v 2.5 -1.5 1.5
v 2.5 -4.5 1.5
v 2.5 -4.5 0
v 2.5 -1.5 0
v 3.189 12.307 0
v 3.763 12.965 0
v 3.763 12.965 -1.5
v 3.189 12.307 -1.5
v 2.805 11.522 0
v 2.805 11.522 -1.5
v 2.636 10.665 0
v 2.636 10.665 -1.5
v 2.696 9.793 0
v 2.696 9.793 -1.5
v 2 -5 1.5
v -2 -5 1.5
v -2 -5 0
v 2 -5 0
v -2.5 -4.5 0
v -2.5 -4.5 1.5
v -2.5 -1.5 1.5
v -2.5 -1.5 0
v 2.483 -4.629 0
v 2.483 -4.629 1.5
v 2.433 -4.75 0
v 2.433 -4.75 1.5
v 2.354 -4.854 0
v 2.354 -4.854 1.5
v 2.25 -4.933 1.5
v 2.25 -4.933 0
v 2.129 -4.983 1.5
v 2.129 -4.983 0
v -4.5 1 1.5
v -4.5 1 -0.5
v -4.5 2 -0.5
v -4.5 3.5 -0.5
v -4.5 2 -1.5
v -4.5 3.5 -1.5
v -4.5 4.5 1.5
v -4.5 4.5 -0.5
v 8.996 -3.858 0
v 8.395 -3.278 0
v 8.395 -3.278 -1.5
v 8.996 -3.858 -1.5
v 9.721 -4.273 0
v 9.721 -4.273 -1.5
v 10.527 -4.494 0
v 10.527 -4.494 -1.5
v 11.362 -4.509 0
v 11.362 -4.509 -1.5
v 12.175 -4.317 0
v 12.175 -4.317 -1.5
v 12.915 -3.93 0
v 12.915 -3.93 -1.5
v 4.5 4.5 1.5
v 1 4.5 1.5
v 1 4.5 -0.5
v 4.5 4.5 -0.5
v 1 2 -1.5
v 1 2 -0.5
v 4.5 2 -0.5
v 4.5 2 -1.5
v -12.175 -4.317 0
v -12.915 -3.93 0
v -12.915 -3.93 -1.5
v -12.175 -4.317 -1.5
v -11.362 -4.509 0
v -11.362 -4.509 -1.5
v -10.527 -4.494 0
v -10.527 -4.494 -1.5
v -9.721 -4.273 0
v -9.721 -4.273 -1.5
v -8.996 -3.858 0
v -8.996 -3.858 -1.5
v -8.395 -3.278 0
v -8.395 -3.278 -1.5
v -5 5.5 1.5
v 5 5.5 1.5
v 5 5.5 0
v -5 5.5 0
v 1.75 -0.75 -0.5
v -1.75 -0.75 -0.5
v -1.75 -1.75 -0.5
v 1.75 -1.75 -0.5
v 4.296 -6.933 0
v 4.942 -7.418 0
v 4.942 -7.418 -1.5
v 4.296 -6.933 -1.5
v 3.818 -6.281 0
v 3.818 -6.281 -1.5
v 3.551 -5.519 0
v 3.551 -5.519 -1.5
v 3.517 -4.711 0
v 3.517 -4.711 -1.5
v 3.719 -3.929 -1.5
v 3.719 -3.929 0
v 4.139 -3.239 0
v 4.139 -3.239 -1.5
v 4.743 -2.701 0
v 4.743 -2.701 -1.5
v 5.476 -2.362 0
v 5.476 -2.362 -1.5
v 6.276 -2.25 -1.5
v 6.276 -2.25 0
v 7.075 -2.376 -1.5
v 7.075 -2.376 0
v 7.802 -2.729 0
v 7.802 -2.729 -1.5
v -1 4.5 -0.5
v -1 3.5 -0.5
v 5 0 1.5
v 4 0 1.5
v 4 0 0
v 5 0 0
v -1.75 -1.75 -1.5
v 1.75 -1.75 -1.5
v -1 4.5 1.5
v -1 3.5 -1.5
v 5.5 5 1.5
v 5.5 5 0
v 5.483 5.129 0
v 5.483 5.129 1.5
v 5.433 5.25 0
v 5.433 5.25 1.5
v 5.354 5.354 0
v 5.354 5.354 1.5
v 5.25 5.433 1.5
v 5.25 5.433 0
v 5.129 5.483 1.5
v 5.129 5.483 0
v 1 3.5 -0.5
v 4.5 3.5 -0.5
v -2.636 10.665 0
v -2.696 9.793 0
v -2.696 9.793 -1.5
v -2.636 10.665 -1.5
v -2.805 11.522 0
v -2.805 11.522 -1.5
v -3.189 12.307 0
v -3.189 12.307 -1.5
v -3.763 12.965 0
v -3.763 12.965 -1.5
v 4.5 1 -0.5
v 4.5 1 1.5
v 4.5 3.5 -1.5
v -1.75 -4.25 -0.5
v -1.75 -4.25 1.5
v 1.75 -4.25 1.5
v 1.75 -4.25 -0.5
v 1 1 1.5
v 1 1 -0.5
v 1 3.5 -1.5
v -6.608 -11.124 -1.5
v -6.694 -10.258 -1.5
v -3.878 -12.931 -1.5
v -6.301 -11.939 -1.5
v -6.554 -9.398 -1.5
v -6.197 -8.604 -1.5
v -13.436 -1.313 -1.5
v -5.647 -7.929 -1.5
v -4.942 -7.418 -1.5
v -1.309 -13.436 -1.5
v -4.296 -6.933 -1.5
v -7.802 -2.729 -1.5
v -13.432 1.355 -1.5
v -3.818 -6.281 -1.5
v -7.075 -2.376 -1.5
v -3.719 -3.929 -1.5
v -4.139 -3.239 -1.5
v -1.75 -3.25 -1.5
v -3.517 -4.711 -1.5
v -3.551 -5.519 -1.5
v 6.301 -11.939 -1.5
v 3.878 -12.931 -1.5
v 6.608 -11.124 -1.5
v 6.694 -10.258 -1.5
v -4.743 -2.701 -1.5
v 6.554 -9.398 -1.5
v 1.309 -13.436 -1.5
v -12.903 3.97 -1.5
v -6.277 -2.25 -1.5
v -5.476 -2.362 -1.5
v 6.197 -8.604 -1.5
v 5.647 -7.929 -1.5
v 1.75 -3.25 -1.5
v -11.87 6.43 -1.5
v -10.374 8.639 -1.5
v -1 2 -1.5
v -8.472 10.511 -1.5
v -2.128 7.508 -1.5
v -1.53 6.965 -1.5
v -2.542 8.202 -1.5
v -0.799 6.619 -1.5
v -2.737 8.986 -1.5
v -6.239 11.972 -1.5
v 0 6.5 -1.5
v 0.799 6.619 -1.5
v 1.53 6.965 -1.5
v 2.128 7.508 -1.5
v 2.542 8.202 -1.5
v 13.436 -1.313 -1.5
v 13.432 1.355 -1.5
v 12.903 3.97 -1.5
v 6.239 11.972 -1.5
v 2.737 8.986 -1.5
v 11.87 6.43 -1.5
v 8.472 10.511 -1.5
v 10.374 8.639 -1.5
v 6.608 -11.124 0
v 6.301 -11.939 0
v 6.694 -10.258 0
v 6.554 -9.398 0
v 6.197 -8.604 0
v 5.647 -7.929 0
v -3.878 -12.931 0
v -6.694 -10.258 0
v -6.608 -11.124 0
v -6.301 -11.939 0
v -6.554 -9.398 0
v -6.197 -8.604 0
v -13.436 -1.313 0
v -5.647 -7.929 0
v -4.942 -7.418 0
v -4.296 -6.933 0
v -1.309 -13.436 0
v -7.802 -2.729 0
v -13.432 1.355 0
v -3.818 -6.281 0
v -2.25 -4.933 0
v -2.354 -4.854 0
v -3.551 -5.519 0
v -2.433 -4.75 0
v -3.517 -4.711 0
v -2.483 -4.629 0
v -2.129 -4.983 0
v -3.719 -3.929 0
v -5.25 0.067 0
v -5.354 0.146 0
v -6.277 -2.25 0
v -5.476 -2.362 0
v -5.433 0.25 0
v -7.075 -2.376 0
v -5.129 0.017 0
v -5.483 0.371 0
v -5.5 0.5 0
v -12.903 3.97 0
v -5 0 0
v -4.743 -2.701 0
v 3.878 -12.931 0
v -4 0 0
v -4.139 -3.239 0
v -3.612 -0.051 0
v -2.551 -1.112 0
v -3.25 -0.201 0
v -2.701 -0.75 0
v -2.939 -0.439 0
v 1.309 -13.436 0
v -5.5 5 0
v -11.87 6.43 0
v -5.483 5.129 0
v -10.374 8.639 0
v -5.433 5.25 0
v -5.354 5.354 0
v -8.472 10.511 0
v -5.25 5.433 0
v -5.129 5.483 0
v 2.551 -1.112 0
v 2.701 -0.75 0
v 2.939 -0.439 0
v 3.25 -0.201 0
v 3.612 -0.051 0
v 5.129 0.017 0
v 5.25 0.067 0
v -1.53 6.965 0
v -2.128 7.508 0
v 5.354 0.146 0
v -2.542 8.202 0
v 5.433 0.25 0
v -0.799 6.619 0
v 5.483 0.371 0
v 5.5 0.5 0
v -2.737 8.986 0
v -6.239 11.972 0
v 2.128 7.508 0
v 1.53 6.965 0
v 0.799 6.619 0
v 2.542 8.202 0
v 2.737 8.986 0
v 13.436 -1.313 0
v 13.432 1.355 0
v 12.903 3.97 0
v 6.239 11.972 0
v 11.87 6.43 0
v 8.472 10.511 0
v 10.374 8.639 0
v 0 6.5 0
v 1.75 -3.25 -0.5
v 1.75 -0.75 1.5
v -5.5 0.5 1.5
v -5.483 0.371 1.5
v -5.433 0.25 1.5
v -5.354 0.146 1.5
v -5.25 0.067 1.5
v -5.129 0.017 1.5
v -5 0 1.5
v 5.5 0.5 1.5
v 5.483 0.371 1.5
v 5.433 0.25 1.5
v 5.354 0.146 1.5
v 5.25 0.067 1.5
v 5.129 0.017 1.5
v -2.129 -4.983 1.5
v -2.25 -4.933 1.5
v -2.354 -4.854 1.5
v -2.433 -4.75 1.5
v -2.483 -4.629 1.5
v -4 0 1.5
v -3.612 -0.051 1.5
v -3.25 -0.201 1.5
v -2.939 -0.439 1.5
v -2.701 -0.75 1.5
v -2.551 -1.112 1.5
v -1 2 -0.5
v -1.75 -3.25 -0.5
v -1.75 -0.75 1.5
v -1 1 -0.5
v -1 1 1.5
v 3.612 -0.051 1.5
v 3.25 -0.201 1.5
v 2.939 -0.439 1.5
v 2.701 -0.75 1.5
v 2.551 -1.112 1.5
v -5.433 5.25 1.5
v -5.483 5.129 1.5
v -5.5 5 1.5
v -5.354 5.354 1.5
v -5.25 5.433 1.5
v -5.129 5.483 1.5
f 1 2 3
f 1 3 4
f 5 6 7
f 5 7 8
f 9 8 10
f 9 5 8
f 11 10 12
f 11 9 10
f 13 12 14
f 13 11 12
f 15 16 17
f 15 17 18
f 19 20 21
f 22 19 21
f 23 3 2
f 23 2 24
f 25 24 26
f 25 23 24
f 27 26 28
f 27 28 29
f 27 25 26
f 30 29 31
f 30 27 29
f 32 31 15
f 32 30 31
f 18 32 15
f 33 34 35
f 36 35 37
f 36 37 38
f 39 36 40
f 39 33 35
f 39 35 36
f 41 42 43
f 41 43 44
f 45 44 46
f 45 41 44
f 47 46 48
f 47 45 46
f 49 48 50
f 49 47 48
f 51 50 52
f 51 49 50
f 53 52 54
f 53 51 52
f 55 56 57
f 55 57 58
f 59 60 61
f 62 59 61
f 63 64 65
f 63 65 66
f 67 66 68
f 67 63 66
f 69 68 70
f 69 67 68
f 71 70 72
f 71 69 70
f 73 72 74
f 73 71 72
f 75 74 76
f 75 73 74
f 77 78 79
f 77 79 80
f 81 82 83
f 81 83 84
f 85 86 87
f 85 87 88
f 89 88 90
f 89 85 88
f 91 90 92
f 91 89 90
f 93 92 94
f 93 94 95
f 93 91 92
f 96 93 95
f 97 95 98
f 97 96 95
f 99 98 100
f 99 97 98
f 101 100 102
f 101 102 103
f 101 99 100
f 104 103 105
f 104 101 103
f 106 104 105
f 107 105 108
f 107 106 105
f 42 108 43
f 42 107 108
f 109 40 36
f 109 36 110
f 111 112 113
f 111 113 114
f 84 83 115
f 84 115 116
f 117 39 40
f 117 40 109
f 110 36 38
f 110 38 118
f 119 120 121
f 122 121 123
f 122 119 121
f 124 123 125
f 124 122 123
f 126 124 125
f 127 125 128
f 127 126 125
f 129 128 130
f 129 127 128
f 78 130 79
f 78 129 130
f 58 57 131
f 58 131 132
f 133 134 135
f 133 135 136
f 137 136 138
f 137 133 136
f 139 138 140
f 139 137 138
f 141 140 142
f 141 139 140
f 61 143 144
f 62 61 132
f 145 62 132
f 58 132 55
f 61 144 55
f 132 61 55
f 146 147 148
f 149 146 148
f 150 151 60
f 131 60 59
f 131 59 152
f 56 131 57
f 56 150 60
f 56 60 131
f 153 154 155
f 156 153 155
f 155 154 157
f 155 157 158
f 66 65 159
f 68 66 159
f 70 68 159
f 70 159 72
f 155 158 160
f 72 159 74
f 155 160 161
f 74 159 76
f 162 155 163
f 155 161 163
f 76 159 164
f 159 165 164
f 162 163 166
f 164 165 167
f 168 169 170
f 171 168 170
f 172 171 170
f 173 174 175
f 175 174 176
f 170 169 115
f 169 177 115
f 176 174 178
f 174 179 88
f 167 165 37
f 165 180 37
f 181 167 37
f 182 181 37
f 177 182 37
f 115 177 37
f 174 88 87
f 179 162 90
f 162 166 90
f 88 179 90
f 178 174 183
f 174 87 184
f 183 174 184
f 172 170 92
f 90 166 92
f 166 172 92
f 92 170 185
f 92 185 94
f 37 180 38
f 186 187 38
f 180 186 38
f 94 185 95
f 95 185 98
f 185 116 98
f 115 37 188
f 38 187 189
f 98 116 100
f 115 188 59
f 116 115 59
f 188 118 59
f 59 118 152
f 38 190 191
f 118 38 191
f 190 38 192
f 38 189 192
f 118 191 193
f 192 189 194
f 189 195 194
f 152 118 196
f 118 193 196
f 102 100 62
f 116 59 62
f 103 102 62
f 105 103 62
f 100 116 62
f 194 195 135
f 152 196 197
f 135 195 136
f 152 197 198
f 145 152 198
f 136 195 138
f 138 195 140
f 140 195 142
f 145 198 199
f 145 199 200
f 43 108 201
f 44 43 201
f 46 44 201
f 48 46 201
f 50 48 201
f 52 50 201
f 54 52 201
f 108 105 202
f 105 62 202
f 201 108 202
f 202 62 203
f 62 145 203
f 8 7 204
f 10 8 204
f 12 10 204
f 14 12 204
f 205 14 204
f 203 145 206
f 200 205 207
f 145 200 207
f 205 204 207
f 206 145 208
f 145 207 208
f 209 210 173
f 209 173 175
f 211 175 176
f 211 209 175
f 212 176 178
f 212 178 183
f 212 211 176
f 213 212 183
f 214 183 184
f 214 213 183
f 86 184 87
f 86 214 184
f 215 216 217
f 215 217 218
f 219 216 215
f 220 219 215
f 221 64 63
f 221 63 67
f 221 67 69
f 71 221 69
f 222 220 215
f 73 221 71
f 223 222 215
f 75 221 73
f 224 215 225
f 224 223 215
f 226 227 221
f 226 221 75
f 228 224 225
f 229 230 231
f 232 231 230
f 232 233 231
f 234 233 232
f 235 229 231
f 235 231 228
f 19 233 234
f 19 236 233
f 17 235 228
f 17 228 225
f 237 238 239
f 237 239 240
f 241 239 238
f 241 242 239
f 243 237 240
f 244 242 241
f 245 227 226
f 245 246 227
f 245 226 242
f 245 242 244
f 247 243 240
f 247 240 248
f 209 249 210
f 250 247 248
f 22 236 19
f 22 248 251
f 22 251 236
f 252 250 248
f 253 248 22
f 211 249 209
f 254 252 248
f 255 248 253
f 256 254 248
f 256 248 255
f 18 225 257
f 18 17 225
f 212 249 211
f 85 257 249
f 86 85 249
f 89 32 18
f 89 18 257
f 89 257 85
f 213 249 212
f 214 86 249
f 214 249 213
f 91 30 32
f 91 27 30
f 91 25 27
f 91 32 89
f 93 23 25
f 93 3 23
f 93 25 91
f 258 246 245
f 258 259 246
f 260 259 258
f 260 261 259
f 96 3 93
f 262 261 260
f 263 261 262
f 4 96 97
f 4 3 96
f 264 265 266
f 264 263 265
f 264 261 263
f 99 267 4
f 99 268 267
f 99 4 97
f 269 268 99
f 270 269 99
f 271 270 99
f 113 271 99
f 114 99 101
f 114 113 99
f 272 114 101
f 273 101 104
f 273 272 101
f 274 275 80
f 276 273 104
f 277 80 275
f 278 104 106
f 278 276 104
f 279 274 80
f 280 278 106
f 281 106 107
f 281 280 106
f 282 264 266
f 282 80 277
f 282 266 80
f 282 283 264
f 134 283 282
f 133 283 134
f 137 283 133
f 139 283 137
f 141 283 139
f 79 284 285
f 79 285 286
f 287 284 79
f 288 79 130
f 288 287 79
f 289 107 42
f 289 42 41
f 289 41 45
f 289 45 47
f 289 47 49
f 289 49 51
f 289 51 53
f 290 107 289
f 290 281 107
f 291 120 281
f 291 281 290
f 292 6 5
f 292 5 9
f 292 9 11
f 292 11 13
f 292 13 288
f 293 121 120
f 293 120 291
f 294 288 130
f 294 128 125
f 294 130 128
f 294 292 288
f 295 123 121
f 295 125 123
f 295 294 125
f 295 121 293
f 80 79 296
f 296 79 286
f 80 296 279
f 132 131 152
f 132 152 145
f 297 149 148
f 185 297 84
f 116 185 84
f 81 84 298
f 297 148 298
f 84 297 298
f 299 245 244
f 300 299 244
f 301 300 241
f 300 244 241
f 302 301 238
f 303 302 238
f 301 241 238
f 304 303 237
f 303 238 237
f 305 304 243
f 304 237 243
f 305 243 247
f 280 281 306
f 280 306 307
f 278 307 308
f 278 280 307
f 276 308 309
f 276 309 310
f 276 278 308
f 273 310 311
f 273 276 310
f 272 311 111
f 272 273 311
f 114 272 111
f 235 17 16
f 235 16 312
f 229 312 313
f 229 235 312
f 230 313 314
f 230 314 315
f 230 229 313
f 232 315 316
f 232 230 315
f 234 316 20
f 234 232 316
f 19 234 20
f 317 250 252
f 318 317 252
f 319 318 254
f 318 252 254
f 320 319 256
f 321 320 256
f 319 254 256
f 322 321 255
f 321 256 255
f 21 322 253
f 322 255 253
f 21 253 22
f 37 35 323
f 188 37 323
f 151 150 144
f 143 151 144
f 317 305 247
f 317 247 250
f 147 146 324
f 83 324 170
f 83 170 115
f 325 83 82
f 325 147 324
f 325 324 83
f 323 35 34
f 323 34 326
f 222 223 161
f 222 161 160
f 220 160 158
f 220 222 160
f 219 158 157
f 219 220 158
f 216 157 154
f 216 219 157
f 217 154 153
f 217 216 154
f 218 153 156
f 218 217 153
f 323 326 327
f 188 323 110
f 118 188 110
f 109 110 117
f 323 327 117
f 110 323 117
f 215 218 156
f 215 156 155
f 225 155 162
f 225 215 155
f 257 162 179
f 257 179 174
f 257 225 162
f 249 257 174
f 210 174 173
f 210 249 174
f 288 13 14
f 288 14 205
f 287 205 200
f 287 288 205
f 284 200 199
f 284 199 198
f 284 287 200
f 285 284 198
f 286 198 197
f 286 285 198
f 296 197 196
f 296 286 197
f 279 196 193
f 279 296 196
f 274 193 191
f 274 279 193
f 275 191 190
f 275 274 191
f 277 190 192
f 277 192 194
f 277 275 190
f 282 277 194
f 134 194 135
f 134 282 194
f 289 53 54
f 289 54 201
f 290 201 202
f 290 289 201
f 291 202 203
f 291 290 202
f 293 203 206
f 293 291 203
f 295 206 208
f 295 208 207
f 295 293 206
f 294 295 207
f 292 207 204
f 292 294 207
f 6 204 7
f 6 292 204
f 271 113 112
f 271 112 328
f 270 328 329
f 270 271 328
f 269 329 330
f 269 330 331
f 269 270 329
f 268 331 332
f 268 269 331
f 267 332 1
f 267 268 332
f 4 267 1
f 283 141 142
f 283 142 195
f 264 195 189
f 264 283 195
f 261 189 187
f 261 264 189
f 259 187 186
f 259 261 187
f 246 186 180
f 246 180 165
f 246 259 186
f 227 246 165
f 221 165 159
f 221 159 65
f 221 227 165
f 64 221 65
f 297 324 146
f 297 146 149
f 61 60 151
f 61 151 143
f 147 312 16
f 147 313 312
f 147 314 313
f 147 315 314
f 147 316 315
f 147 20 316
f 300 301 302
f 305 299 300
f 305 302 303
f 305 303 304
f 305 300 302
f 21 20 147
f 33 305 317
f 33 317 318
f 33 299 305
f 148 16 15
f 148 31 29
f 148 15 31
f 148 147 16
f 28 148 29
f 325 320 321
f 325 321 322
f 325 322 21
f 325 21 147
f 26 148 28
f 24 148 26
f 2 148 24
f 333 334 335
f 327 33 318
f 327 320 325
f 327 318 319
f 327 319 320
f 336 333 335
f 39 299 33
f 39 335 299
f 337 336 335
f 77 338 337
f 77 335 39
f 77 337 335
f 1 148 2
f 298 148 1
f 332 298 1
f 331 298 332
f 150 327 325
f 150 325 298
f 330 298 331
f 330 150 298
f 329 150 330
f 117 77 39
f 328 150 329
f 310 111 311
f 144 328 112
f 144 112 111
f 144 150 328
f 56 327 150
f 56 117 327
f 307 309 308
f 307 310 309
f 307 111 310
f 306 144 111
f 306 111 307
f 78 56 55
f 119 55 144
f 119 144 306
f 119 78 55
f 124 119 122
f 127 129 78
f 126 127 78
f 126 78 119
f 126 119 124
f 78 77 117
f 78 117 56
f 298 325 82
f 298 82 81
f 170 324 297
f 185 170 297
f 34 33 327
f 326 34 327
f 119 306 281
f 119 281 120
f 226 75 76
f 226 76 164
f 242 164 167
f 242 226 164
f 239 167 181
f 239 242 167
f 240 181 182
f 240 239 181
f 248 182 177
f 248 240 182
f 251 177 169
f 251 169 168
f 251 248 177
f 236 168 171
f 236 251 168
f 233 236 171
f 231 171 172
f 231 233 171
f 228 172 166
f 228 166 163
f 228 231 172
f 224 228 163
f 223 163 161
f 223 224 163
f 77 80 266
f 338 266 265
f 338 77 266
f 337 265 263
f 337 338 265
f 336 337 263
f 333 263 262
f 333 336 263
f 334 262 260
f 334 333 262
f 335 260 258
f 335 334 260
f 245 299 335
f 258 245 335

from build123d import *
from OCP.BRepFilletAPI import BRepFilletAPI_MakeFillet

# Parameters (mm, degrees)
SKETCH1_W           = 5.5
SKETCH1_H           = 5.5
BOSS_EXTRUDE1_DEPTH = 1.5
SKETCH5_W           = 5
SKETCH5_H           = 5
BOSS_EXTRUDE2_DEPTH = 3
SKETCH2_W           = 3.5
SKETCH2_H           = 3.5
CUT_EXTRUDE1_DEPTH  = 2
SKETCH10_W          = 3.5
SKETCH10_H          = 1.5
CUT_EXTRUDE3_DEPTH  = 9.031189202
FILLET7_R1          = 0.5
FILLET7_R2          = 1.5
BOSS_EXTRUDE3_DEPTH = 1.5


with BuildPart() as part:
    # Sketch1 → Boss-Extrude1 (new, symmetric)
    with BuildSketch(Plane.XY):
        with Locations((2.75, 2.75)):
            Rectangle(SKETCH1_W, SKETCH1_H)
        with Locations((-2.75, 2.75)):
            Rectangle(SKETCH1_W, SKETCH1_H)
    extrude(amount=BOSS_EXTRUDE1_DEPTH, both=True)

    # Sketch5 → Boss-Extrude2 (add)
    with BuildSketch(Plane.XY.offset(1.5)):
        with Locations((0, -2.5)):
            Rectangle(SKETCH5_W, SKETCH5_H)
    extrude(amount=-BOSS_EXTRUDE2_DEPTH)

    # Sketch2 → Cut-Extrude1 (cut)
    with BuildSketch(Plane.XY.offset(1.5)):
        with Locations((2.75, 2.75)):
            Rectangle(SKETCH2_W, SKETCH2_H)
        with Locations((-2.75, 2.75)):
            Rectangle(SKETCH2_W, SKETCH2_H)
        with Locations((0, -2.5)):
            Rectangle(SKETCH2_W, SKETCH2_H)
    extrude(amount=-CUT_EXTRUDE1_DEPTH, mode=Mode.SUBTRACT)

    # Sketch10 → Cut-Extrude3 (cut, through all)
    with BuildSketch(Plane.XY.offset(-0.5)):
        with Locations((0, -2.5)):
            Rectangle(SKETCH10_W, SKETCH10_H)
        with Locations((2.75, 2.75)):
            Rectangle(SKETCH10_W, SKETCH10_H)
        with Locations((-2.75, 2.75)):
            Rectangle(SKETCH10_W, SKETCH10_H)
    extrude(amount=-CUT_EXTRUDE3_DEPTH, mode=Mode.SUBTRACT)

    # Fillet7: one fillet with a radius per group of edges: ONE call of the kernel's fillet builder (fillet() takes one radius for all edges)
    fillet7_edges_1 = [part.edges().sort_by_distance(p)[0] for p in [
        (5.5, 0, 0),
        (2.5, -5, 0),
        (5.5, 5.5, 0),
        (-5.5, 5.5, 0),
        (-5.5, 0, 0),
        (-2.5, -5, 0),
    ]]
    fillet7_edges_2 = [part.edges().sort_by_distance(p)[0] for p in [
        (2.5, 0, 0),
        (-2.5, 0, 0),
    ]]
    fillet7 = BRepFilletAPI_MakeFillet(part.part.solid().wrapped)
    for e in fillet7_edges_1:
        fillet7.Add(FILLET7_R1, e.wrapped)
    for e in fillet7_edges_2:
        fillet7.Add(FILLET7_R2, e.wrapped)
    add(Compound.cast(fillet7.Shape()), mode=Mode.REPLACE)

    # Sketch11 → Boss-Extrude3 (add, through all)
    with BuildSketch(Plane.XY):
        with BuildLine():
            ThreePointArc((-6.301018176, -11.939311954), (8.8396e-05, -13.5), (6.301174529, -11.939229437))
            ThreePointArc((6.301174529, -11.939229437), (6.554033768, -9.398401396), (4.941977619, -7.41824486))
            ThreePointArc((4.941977619, -7.41824486), (4.139435534, -3.238722534), (8.395134632, -3.277528018))
            ThreePointArc((8.395134632, -3.277528018), (10.526696598, -4.494141765), (12.915304874, -3.93))
            ThreePointArc((12.915304874, -3.93), (11.870145687, 6.430368681), (3.762845966, 12.964990946))
            ThreePointArc((3.762845966, 12.964990946), (2.804609837, 11.521965342), (2.695822199, 9.793178304))
            ThreePointArc((2.695822199, 9.793178304), (0, 6.5), (-2.695822199, 9.793178304))
            ThreePointArc((-2.695822199, 9.793178304), (-2.804609837, 11.521965342), (-3.762845966, 12.964990946))
            ThreePointArc((-3.762845966, 12.964990946), (-11.870183671, 6.430298564), (-12.915258444, -3.930152581))
            ThreePointArc((-12.915258444, -3.930152581), (-10.526666364, -4.494205663), (-8.395162612, -3.277562841))
            ThreePointArc((-8.395162612, -3.277562841), (-4.139464145, -3.238688227), (-4.941938337, -7.418223589))
            ThreePointArc((-4.941938337, -7.418223589), (-6.553975653, -9.398450665), (-6.301018176, -11.939311954))
        make_face()
        with BuildLine():
            Line((-2.5, -1.5), (-2.5, -4.5))
            ThreePointArc((-2.5, -4.5), (-2.353553391, -4.853553391), (-2, -5))
            Line((-2, -5), (2, -5))
            ThreePointArc((2, -5), (2.353553391, -4.853553391), (2.5, -4.5))
            Line((2.5, -4.5), (2.5, -1.5))
            ThreePointArc((2.5, -1.5), (2.939339828, -0.439339828), (4, 0))
            Line((4, 0), (5, 0))
            ThreePointArc((5, 0), (5.353553391, 0.146446609), (5.5, 0.5))
            Line((5.5, 0.5), (5.5, 5))
            ThreePointArc((5.5, 5), (5.353553391, 5.353553391), (5, 5.5))
            Line((5, 5.5), (-5, 5.5))
            ThreePointArc((-5, 5.5), (-5.353553391, 5.353553391), (-5.5, 5))
            Line((-5.5, 5), (-5.5, 0.5))
            ThreePointArc((-5.5, 0.5), (-5.353553391, 0.146446609), (-5, 0))
            Line((-5, 0), (-4, 0))
            ThreePointArc((-4, 0), (-2.939339828, -0.439339828), (-2.5, -1.5))
        make_face(mode=Mode.SUBTRACT)
    extrude(amount=-BOSS_EXTRUDE3_DEPTH)


solid = part.part
